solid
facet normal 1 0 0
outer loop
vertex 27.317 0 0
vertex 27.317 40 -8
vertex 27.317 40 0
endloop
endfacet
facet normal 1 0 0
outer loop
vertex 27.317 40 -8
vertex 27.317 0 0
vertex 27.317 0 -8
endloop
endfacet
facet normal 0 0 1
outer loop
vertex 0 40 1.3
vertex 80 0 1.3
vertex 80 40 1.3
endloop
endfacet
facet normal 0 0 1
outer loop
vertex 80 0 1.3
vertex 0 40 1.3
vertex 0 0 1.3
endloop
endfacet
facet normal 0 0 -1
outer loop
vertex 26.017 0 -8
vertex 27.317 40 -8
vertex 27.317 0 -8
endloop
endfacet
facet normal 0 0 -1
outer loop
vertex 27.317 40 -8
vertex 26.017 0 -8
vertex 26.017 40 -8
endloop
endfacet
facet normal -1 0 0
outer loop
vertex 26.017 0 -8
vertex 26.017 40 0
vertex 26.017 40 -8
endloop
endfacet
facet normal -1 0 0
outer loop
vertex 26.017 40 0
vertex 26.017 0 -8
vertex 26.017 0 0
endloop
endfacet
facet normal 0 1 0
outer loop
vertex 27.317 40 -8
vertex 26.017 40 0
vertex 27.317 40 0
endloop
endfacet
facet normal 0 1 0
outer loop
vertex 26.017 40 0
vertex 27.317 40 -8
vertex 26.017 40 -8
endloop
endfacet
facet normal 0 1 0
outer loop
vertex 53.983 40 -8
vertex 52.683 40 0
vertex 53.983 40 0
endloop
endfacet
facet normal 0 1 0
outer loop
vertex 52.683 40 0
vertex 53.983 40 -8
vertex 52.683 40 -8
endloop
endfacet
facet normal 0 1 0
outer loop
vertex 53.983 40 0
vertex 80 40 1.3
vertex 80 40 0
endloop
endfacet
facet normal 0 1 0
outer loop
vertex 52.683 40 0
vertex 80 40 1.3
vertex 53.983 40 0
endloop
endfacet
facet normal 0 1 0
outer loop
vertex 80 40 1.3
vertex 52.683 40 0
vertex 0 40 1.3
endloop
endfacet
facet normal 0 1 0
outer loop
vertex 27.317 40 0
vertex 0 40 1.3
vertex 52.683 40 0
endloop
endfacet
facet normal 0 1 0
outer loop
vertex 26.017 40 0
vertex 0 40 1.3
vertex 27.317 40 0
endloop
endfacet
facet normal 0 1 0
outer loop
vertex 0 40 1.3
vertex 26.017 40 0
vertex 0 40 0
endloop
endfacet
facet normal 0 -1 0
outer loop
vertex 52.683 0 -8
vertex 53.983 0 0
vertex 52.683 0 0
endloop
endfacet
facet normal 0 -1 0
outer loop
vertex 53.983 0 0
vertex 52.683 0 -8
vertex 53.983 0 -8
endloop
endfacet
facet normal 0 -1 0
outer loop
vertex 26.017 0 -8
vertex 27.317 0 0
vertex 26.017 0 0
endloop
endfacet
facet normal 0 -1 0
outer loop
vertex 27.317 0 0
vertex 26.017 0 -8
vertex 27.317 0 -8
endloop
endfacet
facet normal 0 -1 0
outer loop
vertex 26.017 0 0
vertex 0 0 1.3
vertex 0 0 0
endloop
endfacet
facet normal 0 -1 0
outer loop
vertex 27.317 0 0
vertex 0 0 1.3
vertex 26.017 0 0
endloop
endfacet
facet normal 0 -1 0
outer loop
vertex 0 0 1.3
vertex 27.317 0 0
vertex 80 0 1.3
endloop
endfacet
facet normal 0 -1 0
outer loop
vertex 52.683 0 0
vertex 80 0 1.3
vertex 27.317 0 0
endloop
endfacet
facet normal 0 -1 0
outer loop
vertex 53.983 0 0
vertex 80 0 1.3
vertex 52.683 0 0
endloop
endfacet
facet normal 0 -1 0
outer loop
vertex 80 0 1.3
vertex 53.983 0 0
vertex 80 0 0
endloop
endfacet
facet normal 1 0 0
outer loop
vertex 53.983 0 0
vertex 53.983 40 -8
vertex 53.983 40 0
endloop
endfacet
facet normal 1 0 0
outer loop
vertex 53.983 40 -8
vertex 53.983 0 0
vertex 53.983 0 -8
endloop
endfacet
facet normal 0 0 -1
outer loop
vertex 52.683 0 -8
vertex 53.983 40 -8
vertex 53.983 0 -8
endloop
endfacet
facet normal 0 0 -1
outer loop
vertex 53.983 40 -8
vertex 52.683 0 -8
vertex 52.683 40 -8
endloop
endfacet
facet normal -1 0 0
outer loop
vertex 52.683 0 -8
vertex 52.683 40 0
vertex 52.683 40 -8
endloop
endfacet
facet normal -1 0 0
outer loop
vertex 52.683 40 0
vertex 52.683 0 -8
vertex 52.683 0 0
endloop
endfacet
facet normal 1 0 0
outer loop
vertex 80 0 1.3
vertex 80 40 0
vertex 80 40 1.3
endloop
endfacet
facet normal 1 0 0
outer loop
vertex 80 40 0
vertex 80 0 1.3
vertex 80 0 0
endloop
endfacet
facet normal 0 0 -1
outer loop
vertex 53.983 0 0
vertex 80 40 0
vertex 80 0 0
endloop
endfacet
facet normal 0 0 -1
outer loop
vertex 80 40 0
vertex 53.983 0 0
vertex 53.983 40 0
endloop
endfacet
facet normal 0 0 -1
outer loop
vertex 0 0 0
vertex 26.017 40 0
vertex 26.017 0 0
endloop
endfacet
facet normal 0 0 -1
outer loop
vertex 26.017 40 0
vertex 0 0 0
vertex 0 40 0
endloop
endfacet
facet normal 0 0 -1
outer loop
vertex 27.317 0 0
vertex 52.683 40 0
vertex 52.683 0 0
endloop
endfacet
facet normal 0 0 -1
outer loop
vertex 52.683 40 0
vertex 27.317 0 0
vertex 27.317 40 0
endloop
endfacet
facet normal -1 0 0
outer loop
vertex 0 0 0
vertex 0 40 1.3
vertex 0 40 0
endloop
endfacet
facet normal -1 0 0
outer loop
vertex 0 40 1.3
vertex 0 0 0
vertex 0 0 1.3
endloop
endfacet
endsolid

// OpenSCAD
$fn = 32;

// ----------------------------------------------------------------------
// Ribbed panel: 1.3 mm panel
// ----------------------------------------------------------------------

// --- parameters (mm) ---
panel_l = 80;             // panel length, X
panel_w = 40;             // panel width, Y
panel_t = 1.3;            // panel thickness, Z
rib_t = 1.3;              // rib thickness
rib_h = 8;                // rib height below the panel
ribs = 2;                 // number of ribs

total_h = panel_t + rib_h;  // overall height

union() {
  cube([panel_l, panel_w, panel_t]);
  for (i = [1 : ribs])
    translate([i * panel_l / (ribs + 1) - rib_t / 2, 0, -rib_h])
      cube([rib_t, panel_w, rib_h + panel_t]);
}
